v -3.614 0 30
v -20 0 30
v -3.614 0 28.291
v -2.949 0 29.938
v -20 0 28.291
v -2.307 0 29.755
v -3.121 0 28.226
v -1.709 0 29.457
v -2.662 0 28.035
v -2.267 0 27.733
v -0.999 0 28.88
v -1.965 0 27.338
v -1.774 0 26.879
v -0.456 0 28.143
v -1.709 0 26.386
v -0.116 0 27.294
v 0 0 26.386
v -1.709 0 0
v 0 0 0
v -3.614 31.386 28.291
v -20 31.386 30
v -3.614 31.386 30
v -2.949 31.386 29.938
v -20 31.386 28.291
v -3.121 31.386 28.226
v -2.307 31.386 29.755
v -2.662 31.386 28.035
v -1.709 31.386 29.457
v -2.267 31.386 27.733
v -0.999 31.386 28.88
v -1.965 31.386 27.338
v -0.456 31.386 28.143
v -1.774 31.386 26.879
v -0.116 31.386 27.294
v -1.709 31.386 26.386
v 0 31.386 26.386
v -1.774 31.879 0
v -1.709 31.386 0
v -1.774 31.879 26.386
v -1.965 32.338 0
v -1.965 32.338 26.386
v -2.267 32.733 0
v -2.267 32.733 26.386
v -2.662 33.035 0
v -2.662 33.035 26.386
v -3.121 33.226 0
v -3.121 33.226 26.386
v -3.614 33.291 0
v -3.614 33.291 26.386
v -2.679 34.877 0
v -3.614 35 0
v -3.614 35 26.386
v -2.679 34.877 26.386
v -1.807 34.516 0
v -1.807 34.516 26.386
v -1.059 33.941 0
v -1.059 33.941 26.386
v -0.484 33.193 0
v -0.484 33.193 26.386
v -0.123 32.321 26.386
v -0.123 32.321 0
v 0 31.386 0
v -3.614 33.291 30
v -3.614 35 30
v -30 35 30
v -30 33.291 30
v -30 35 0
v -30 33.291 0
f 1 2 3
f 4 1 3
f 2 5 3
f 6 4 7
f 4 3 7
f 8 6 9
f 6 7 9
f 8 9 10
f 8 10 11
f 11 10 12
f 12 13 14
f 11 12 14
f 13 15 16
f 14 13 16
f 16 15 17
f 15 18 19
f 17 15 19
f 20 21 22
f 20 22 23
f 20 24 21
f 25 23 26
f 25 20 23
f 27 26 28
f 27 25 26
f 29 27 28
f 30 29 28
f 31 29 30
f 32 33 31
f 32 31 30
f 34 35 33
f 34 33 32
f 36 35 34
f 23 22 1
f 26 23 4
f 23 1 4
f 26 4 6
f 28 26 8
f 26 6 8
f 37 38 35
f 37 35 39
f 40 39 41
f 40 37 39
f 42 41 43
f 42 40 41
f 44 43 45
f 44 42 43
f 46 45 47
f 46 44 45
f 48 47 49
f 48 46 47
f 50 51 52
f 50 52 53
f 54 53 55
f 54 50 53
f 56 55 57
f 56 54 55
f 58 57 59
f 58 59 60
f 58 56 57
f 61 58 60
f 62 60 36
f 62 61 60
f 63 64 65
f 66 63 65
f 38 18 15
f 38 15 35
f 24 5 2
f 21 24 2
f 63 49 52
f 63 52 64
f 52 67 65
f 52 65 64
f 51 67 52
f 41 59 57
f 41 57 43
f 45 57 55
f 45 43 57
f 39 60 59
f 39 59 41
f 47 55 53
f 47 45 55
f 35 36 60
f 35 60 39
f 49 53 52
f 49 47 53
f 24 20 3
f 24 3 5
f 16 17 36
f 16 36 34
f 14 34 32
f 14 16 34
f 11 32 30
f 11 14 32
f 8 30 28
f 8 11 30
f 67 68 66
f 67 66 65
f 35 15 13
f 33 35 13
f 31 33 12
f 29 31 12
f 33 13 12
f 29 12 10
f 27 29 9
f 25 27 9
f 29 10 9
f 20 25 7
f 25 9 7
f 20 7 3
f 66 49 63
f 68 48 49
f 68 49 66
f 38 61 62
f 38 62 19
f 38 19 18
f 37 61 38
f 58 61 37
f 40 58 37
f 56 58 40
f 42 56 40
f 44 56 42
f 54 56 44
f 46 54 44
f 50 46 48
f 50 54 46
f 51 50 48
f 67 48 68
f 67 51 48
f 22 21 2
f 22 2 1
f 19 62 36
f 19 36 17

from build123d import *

# Parameters (mm, degrees)
BASE_FLANGE1_DEPTH   = 30
EDGE_FLANGE1_DEPTH   = 35
EDGE_FLANGE1_START   = 31.38558
EDGE_FLANGE1_2_DEPTH = 3.61442
EDGE_FLANGE1_3_DEPTH = 31.38558


# Read off the part's stored shape, not the designer's step: Edge-Flange1
# Sheet-metal steps are written as plain solids
with BuildPart() as part:
    # Sketch1 → Base-Flange1 (new body)
    with BuildSketch(Plane.XY):
        with BuildLine():
            Line((-30, 35), (-3.61442, 35))
            ThreePointArc((-3.61442, 35), (-1.058639108, 33.941360892), (0, 31.38558))
            Line((0, 31.38558), (0, 0))
            Line((0, 0), (-1.70942, 0))
            Line((-1.70942, 0), (-1.70942, 31.38558))
            ThreePointArc((-1.70942, 31.38558), (-2.267381582, 32.732618418), (-3.61442, 33.29058))
            Line((-3.61442, 33.29058), (-30, 33.29058))
            Line((-30, 33.29058), (-30, 35))
        make_face()
    extrude(amount=BASE_FLANGE1_DEPTH)

    # Edge-Flange1 outline → Edge-Flange1 (cut)
    with BuildSketch(Plane(origin=(0, 0, 0), x_dir=(1, 0, 0), z_dir=(0, 1, 0))):
        with BuildLine():
            Line((-3.61442, -30), (0, -30))
            Line((0, -30), (0, -26.38558))
            ThreePointArc((0, -26.38558), (-1.058639108, -28.941360892), (-3.61442, -30))
        make_face()
        with BuildLine():
            Line((-3.61442, -26.38558), (-3.61442, -28.29058))
            ThreePointArc((-3.61442, -28.29058), (-2.267381582, -27.732618418), (-1.70942, -26.38558))
            Line((-1.70942, -26.38558), (-3.61442, -26.38558))
        make_face()
    extrude(amount=EDGE_FLANGE1_DEPTH, mode=Mode.SUBTRACT)

    # Edge-Flange1 2 outline → Edge-Flange1 2 (cut)
    with BuildSketch(Plane(origin=(0, 0, 0), x_dir=(1, 0, 0), z_dir=(0, 1, 0)).offset(EDGE_FLANGE1_START)):
        with BuildLine():
            Line((-3.61442, -28.29058), (-3.61442, -30))
            ThreePointArc((-3.61442, -30), (-1.058639108, -28.941360892), (0, -26.38558))
            Line((0, -26.38558), (-1.70942, -26.38558))
            ThreePointArc((-1.70942, -26.38558), (-2.267381582, -27.732618418), (-3.61442, -28.29058))
        make_face()
    extrude(amount=EDGE_FLANGE1_2_DEPTH, mode=Mode.SUBTRACT)

    # Edge-Flange1 3 outline → Edge-Flange1 3 (add)
    with BuildSketch(Plane(origin=(0, 0, 0), x_dir=(1, 0, 0), z_dir=(0, 1, 0))):
        with BuildLine():
            Line((-20, -30), (-3.61442, -30))
            ThreePointArc((-3.61442, -30), (-2.624012381, -29.861658924), (-1.70942, -29.45722564))
            Line((-1.70942, -29.45722564), (-1.70942, -26.38558))
            ThreePointArc((-1.70942, -26.38558), (-2.267381582, -27.732618418), (-3.61442, -28.29058))
            Line((-3.61442, -28.29058), (-20, -28.29058))
            Line((-20, -28.29058), (-20, -30))
        make_face()
    extrude(amount=EDGE_FLANGE1_3_DEPTH)


solid = part.part
